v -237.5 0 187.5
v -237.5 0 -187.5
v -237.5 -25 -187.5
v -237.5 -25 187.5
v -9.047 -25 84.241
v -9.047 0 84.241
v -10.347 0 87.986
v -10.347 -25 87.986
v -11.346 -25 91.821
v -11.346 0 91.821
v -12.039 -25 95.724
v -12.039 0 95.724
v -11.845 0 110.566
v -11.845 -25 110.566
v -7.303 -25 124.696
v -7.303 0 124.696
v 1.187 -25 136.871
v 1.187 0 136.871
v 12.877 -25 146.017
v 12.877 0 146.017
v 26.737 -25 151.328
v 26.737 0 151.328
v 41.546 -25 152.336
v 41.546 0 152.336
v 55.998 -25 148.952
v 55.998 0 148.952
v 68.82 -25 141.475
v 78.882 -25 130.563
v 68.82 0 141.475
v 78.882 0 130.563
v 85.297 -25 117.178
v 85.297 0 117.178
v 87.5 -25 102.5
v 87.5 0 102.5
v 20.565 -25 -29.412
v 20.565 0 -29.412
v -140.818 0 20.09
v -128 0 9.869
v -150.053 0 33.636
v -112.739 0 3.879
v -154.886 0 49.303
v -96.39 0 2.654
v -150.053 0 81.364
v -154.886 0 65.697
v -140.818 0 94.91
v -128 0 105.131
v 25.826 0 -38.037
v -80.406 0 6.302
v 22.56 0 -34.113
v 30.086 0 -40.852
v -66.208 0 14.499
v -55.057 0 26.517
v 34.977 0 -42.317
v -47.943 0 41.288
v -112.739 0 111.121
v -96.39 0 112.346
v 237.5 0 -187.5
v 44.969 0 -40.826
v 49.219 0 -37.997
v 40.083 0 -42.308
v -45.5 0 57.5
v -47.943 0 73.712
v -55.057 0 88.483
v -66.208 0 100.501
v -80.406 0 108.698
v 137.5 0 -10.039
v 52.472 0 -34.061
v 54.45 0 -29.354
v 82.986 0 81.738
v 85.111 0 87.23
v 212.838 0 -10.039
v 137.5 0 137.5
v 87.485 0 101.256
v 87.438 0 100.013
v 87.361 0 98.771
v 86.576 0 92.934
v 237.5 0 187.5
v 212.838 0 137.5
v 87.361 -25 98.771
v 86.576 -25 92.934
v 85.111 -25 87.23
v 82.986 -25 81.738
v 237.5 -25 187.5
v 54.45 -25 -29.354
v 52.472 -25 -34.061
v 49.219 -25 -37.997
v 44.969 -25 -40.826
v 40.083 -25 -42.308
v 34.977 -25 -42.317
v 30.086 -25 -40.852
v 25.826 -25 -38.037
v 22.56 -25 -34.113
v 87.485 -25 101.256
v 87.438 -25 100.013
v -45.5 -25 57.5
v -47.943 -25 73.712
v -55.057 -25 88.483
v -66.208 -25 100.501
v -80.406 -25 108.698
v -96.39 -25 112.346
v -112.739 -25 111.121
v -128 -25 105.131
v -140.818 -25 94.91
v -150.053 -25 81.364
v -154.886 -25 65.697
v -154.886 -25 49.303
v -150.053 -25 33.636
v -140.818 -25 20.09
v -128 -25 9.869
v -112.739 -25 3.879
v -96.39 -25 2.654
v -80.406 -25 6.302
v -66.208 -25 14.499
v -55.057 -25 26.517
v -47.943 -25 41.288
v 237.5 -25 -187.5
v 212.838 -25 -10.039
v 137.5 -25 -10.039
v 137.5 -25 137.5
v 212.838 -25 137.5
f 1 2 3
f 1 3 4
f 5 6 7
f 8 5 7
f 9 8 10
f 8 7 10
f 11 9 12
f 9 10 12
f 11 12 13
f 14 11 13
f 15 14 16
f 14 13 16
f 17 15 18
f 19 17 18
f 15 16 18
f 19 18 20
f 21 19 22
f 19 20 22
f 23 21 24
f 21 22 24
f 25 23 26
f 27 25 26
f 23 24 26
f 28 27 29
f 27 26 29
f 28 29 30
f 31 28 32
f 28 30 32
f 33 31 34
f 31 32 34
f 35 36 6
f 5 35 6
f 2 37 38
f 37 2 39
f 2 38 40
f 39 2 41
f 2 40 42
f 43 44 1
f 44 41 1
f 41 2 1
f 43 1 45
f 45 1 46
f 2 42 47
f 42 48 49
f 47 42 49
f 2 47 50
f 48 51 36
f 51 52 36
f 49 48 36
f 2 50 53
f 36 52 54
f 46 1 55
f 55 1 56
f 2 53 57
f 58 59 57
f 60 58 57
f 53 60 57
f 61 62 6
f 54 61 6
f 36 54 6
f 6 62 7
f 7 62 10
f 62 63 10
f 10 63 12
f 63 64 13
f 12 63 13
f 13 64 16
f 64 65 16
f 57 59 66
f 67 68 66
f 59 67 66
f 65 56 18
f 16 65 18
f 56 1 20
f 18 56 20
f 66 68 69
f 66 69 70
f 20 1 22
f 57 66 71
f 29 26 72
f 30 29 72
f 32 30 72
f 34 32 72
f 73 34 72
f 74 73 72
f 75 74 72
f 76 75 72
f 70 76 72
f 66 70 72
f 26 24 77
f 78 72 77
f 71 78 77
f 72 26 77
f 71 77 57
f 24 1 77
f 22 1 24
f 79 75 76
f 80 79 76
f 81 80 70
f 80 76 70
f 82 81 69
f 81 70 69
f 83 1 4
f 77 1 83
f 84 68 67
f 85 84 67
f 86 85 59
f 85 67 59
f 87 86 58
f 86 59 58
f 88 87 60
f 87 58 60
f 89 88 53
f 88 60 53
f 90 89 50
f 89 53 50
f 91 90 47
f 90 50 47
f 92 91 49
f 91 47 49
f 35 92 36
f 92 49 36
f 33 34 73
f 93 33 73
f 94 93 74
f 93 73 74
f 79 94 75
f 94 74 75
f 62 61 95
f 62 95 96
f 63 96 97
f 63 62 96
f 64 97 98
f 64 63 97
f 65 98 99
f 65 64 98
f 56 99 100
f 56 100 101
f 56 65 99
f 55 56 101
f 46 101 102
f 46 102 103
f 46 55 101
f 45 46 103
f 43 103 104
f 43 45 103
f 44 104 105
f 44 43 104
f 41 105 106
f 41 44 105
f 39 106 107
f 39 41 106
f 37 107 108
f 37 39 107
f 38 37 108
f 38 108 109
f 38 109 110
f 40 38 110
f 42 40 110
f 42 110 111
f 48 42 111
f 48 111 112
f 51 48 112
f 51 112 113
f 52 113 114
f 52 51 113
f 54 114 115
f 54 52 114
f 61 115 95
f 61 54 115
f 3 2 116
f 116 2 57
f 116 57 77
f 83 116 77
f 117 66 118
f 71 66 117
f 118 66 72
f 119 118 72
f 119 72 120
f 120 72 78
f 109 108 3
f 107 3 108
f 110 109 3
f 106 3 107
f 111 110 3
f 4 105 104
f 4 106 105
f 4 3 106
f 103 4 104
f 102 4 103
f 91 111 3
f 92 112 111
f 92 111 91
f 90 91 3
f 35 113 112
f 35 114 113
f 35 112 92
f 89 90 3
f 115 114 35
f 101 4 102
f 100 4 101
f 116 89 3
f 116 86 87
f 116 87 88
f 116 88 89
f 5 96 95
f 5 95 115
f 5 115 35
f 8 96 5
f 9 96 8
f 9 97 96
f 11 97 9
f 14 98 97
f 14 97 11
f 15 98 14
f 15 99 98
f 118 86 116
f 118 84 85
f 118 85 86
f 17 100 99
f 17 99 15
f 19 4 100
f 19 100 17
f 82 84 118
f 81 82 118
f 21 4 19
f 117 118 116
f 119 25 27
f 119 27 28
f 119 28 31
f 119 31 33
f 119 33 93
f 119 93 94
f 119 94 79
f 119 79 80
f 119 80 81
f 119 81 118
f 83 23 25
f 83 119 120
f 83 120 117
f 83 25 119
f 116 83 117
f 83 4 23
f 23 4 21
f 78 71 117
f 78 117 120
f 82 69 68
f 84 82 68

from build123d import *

# Parameters (mm, degrees)
F0_W     = 475
F0_H     = 375
F0_R     = 55
F0_W_2   = 75.338244
F0_H_2   = 147.539295
F1_DEPTH = 25


with BuildPart() as f1:
    # F0 (on Front) → F1 (new body)
    with BuildSketch(Plane.XZ):
        Rectangle(F0_W, F0_H)
        with Locations((-100.5, 57.5)):
            Circle(F0_R, mode=Mode.SUBTRACT)
        with BuildLine():
            ThreePointArc((-12.038727, 95.723974), (34.104146, 152.384548), (87.5, 102.5))
            ThreePointArc((87.5, 102.5), (87.465172, 100.6341), (87.360737, 98.770799))
            ThreePointArc((87.360737, 98.770799), (85.927868, 90.060481), (82.985546, 81.737893))
            Line((82.985546, 81.737893), (54.449754, -29.353832))
            ThreePointArc((54.449754, -29.353832), (37.530195, -42.499974), (20.565372, -29.412296))
            Line((20.565372, -29.412296), (-9.046864, 84.241046))
            ThreePointArc((-9.046864, 84.241046), (-10.884653, 89.893439), (-12.038727, 95.723974))
        make_face(mode=Mode.SUBTRACT)
        with Locations((175.169122, 63.730353)):
            Rectangle(F0_W_2, F0_H_2, mode=Mode.SUBTRACT)
    extrude(amount=F1_DEPTH)


solid = f1.part
